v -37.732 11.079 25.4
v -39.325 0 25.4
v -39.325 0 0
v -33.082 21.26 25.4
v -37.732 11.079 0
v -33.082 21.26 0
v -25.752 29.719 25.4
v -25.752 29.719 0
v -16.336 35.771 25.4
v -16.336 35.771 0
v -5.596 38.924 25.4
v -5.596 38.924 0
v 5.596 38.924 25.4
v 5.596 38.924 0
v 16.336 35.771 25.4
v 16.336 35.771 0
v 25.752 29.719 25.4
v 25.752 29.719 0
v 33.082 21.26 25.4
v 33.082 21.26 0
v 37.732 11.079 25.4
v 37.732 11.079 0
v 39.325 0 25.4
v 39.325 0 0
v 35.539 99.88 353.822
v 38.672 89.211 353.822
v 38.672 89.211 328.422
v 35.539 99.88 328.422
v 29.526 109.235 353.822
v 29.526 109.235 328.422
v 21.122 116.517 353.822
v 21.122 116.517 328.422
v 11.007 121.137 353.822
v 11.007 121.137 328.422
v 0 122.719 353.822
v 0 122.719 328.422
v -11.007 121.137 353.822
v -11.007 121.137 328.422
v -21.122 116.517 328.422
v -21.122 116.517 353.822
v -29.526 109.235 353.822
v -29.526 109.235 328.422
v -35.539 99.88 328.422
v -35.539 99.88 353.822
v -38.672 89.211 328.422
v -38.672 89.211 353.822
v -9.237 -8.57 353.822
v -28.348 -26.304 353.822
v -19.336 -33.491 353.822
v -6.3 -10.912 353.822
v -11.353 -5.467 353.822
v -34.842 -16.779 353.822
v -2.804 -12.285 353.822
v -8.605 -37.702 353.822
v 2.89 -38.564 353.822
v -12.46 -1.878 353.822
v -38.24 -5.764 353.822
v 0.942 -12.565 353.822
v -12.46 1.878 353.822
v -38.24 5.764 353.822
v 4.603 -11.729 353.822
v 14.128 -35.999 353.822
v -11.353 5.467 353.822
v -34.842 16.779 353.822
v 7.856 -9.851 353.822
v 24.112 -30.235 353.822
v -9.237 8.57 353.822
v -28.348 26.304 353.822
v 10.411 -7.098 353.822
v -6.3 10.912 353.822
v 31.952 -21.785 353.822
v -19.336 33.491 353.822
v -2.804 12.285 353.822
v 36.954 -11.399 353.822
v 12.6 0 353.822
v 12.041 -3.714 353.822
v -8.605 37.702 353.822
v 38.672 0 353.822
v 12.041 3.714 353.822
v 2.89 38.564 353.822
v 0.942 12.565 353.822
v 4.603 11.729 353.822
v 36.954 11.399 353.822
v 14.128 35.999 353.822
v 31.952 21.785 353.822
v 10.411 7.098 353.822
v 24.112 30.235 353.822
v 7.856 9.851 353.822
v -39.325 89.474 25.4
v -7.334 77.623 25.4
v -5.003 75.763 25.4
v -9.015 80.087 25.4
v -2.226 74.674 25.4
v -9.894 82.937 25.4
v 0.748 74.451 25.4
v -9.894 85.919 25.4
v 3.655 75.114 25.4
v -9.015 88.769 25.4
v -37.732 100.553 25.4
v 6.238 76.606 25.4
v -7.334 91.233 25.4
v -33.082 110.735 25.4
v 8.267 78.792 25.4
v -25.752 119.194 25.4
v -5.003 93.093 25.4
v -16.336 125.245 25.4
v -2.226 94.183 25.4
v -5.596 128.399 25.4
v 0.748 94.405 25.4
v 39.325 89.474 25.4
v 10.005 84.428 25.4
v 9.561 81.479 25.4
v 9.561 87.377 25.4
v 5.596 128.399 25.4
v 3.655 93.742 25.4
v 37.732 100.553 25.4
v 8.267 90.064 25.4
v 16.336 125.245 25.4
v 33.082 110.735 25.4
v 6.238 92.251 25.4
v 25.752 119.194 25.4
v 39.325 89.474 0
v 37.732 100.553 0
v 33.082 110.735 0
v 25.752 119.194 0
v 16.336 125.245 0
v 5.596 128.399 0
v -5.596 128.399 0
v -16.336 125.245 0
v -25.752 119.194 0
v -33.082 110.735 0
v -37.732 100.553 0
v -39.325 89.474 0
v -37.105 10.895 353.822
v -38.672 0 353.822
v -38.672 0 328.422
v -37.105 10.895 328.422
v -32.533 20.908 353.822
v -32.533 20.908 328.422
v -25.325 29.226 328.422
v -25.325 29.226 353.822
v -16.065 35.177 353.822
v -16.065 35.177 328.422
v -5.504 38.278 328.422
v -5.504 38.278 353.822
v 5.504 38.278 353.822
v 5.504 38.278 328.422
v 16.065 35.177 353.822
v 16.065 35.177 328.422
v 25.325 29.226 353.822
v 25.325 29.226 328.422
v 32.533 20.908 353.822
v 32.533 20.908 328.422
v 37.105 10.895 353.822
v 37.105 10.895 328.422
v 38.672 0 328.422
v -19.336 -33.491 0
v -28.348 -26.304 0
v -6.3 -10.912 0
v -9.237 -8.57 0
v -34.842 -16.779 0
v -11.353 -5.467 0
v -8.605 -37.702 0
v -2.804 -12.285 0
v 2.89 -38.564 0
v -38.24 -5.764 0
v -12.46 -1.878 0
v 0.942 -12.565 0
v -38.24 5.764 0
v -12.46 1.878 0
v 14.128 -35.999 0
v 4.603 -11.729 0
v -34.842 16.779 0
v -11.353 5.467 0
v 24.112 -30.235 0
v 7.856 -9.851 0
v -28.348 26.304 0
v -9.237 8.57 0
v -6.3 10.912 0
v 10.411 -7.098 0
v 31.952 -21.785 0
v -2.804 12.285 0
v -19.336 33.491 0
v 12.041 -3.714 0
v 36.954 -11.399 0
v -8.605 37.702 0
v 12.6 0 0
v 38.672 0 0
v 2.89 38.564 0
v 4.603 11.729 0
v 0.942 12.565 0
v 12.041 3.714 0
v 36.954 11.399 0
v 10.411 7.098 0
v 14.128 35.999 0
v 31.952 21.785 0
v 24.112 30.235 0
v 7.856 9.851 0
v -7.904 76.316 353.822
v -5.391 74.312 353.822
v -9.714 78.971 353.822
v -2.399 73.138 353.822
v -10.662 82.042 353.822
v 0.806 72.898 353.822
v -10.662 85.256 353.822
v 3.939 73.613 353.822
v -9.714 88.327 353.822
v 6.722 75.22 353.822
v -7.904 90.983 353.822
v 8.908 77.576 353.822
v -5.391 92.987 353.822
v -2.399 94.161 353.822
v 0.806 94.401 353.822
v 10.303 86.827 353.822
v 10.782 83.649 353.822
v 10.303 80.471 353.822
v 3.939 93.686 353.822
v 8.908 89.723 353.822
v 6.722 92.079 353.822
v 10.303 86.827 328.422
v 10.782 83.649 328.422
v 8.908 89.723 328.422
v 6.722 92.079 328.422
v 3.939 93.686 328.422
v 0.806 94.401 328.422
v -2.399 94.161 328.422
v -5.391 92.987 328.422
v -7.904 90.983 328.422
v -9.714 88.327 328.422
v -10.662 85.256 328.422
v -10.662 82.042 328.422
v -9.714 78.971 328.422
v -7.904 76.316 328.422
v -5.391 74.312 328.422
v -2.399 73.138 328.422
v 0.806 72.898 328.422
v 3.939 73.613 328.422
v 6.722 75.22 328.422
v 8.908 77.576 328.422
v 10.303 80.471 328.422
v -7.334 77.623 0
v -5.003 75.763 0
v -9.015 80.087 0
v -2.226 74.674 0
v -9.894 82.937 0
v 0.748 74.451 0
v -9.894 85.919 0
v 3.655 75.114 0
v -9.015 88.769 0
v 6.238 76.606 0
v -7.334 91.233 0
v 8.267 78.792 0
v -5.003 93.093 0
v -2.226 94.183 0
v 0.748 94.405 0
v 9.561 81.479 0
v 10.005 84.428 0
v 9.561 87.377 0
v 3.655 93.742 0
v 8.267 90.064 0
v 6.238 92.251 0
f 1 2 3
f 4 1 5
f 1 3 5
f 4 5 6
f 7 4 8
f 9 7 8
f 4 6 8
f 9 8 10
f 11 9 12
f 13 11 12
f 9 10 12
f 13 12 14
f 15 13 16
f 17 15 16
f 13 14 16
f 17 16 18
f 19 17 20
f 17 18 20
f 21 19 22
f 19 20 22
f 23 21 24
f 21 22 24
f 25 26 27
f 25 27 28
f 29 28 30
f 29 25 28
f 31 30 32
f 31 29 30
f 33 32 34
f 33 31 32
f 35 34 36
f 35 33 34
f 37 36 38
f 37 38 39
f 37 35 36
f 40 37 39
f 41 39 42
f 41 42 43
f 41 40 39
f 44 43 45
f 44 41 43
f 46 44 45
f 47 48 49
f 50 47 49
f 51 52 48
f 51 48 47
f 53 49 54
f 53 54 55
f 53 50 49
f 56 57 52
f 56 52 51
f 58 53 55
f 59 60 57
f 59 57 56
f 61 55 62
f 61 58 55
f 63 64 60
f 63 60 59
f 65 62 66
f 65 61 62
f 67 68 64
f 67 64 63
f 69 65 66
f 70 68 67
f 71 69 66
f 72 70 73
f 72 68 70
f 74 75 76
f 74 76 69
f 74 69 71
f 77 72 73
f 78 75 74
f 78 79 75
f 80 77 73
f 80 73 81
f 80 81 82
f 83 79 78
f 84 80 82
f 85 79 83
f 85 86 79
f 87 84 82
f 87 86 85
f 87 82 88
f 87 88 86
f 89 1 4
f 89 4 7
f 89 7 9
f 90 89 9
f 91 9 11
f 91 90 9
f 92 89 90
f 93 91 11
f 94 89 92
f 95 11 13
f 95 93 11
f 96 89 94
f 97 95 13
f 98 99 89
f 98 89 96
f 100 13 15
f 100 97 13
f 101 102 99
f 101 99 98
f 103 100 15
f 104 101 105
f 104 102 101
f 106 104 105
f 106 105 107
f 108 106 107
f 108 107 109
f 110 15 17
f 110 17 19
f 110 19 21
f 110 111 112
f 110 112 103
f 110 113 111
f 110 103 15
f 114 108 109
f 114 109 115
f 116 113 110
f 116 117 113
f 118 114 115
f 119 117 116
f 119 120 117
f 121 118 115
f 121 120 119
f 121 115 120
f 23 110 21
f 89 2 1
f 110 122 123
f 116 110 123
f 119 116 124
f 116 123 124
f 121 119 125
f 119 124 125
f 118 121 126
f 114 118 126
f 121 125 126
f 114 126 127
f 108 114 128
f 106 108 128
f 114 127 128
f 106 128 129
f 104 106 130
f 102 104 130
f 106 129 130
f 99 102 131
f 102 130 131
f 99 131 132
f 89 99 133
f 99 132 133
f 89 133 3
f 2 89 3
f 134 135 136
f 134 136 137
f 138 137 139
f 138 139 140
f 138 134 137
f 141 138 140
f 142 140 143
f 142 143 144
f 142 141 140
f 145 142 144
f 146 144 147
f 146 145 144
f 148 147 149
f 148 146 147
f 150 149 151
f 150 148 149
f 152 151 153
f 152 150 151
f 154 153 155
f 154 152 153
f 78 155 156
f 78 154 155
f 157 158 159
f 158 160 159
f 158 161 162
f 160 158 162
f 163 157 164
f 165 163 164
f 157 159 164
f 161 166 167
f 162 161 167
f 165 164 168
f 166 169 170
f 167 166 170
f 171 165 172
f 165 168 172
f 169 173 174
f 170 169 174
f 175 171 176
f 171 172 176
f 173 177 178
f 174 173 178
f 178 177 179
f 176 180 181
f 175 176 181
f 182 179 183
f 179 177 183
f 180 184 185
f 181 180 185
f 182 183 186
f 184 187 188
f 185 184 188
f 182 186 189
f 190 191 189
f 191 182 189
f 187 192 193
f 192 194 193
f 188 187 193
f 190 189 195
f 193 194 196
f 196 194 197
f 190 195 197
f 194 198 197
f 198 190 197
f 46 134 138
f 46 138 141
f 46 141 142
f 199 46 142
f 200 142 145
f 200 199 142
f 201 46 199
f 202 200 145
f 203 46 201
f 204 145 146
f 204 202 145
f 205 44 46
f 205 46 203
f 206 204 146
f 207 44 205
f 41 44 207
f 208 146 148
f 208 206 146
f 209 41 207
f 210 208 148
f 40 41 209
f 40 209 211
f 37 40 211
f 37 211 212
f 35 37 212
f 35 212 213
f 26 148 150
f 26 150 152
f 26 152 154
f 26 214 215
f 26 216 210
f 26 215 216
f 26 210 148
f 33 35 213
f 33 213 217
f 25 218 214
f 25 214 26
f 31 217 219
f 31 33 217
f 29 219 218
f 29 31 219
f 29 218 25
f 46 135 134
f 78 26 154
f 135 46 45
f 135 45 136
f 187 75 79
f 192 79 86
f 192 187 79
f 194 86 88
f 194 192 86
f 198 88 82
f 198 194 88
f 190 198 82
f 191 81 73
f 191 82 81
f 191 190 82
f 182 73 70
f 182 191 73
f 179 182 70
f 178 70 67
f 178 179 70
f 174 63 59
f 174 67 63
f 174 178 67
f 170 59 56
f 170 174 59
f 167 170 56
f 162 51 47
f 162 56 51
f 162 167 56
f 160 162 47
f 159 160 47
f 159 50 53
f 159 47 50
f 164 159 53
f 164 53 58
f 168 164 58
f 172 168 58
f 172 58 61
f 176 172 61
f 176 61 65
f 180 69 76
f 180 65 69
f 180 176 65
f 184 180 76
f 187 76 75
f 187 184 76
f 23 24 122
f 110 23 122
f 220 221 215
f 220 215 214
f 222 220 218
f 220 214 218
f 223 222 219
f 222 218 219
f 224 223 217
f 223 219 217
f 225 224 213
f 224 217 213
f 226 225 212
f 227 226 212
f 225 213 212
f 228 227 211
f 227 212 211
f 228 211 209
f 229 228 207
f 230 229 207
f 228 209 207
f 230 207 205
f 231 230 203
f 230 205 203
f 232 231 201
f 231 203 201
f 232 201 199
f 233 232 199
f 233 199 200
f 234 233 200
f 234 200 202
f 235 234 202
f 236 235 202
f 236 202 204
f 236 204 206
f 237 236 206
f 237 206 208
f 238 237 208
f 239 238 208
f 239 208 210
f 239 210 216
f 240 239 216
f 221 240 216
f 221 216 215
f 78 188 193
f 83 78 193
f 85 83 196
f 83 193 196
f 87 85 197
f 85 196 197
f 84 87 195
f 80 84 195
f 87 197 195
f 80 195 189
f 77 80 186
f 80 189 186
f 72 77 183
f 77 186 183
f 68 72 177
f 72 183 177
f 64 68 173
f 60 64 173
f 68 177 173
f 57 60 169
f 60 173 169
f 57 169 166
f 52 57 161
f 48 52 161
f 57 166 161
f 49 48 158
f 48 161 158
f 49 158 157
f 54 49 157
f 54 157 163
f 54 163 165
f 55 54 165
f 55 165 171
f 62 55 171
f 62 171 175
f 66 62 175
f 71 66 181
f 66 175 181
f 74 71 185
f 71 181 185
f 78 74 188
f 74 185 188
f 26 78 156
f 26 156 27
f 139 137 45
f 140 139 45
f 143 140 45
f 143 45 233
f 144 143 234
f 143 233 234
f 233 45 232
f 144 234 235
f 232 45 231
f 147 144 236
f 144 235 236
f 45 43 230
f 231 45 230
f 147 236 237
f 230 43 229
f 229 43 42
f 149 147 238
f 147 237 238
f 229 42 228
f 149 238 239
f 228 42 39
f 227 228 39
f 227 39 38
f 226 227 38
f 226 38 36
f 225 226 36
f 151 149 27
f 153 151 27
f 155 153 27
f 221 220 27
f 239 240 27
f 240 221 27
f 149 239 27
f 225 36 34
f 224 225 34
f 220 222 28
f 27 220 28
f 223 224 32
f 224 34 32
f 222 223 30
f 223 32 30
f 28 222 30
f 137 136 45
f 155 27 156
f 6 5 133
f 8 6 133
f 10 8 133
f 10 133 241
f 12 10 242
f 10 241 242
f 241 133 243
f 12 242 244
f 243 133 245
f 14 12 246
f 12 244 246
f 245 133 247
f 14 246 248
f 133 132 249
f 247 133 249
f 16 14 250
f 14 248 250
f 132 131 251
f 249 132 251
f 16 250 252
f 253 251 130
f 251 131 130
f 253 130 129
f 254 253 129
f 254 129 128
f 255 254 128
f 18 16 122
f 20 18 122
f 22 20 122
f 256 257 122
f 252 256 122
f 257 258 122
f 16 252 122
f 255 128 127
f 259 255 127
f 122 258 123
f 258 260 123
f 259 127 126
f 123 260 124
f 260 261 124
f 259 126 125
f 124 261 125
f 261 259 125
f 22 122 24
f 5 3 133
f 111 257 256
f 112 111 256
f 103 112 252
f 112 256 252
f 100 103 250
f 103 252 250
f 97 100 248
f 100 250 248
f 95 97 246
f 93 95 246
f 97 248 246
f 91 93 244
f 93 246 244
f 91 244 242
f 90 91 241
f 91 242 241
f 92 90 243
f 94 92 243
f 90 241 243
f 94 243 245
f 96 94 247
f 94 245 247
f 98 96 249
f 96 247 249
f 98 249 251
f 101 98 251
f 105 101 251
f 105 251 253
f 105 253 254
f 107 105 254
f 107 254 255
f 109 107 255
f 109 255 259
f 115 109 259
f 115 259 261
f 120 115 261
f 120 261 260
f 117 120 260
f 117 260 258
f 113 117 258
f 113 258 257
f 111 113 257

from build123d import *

# Parameters (mm, degrees)
F0_R      = 38.6718500402
F1_DEPTH  = 353.822
F2_R      = 12.6004290601
F3_DEPTH  = 353.823
F5_DEPTH  = 25.4
F7_DEPTH  = 25.4
F8_R      = 10.7819681828
F9_DEPTH  = 353.823
F10_R     = 10.0053513845
F11_DEPTH = 353.823


with BuildPart() as f1:
    # F0 (on Top) → F1 (new body)
    with BuildSketch(Plane.XY):
        Circle(F0_R)
    extrude(amount=F1_DEPTH)

    # F2 (on Top) → F3 (cut, through all)
    with BuildSketch(Plane.XY):
        Circle(F2_R)
    extrude(amount=F3_DEPTH, mode=Mode.SUBTRACT)


with BuildPart() as f5:
    # F4 (on Top) → F5 (new body)
    with BuildSketch(Plane.XY):
        with BuildLine():
            Line((-39.3245220184, 75.7770314813), (-39.3245220184, 0))
            ThreePointArc((-39.3245220184, 0), (3.7253e-06, 39.3245257437), (39.324529469, 0))
            Line((39.324529469, 0), (39.324529469, 75.7770314813))
            Line((39.324529469, 75.7770314813), (39.324529469, 89.4743427634))
            ThreePointArc((39.324529469, 89.4743427634), (3.7253e-06, 128.7988685071), (-39.3245220184, 89.4743427634))
            Line((-39.3245220184, 89.4743427634), (-39.3245220184, 75.7770314813))
        make_face()
    extrude(amount=F5_DEPTH)

    # F10 (on face) → F11 (cut, through all)
    with BuildSketch(Plane(origin=(0, 0, 0), x_dir=(1, 0, 0), z_dir=(0, 0, -1))):
        with Locations((0, -84.4281241298)):
            Circle(F10_R)
    extrude(amount=-F11_DEPTH, mode=Mode.SUBTRACT)


with BuildPart() as f7:
    # F6 (on face) → F7 (new body)
    with BuildSketch(Plane.XY.offset(353.822)):
        with BuildLine():
            Line((-38.6718500402, 89.2108008265), (-38.6718500402, 0))
            ThreePointArc((-38.6718500402, 0), (0, 38.6718500402), (38.6718500402, 0))
            Line((38.6718500402, 0), (38.6718500402, 89.2108008265))
            ThreePointArc((38.6718500402, 89.2108008265), (0, 122.719078192), (-38.6718500402, 89.2108008265))
        make_face()
    extrude(amount=-F7_DEPTH)

    # F8 (on face) → F9 (cut, through all)
    with BuildSketch(Plane.XY.offset(353.822)):
        with Locations((0, 83.6493789506)):
            Circle(F8_R)
    extrude(amount=-F9_DEPTH, mode=Mode.SUBTRACT)


solid = Compound([f1.part, f5.part, f7.part])
